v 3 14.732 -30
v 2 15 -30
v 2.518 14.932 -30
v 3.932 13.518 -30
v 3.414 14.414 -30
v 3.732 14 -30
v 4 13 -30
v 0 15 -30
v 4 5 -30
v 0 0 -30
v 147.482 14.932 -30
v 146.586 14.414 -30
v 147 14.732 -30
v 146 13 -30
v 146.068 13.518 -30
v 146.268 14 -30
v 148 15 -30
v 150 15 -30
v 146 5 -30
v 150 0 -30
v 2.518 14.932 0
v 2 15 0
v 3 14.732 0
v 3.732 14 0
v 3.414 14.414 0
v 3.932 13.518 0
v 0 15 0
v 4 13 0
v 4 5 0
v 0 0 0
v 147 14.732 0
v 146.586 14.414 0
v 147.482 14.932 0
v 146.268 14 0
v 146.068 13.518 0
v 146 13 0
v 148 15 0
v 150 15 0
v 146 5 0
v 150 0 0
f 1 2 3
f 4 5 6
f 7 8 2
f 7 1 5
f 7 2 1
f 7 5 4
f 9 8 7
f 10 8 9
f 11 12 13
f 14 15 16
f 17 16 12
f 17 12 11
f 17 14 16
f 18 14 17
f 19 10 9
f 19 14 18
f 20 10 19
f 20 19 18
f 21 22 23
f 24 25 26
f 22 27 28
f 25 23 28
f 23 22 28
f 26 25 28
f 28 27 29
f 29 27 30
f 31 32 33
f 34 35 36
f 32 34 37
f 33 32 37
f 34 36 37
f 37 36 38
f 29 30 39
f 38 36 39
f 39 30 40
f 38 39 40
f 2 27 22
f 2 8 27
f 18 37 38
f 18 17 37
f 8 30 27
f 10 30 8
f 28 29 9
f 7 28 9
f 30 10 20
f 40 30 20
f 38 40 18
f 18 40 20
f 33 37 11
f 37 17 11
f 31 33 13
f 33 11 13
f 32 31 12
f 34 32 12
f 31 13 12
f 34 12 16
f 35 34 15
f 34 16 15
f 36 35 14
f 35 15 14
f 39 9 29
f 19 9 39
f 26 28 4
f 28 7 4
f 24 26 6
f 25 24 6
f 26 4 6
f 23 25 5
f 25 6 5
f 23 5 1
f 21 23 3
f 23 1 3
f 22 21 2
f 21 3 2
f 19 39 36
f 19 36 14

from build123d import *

# Parameters (mm, degrees)
SKETCH1_W           = 150
SKETCH1_H           = 30
BOSS_EXTRUDE1_DEPTH = 5
SKETCH3_W           = 4
SKETCH3_H           = 30
BOSS_EXTRUDE2_DEPTH = 10
SKETCH4_W           = 4
SKETCH4_H           = 30
BOSS_EXTRUDE3_DEPTH = 10
FILLET1_R           = 2


with BuildPart() as part:
    # Sketch1 → Boss-Extrude1 (new body)
    with BuildSketch(Plane(origin=(0, 0, 0), x_dir=(1, 0, 0), z_dir=(0, 1, 0))):
        with Locations((75, 15)):
            Rectangle(SKETCH1_W, SKETCH1_H)
    extrude(amount=BOSS_EXTRUDE1_DEPTH)

    # Sketch3 → Boss-Extrude2 (add)
    with BuildSketch(Plane(origin=(0, 5, 0), x_dir=(1, 0, 0), z_dir=(0, 1, 0))):
        with Locations((148, 15)):
            Rectangle(SKETCH3_W, SKETCH3_H)
    extrude(amount=BOSS_EXTRUDE2_DEPTH)

    # Sketch4 → Boss-Extrude3 (add)
    with BuildSketch(Plane(origin=(0, 5, 0), x_dir=(1, 0, 0), z_dir=(0, 1, 0))):
        with Locations((2, 15)):
            Rectangle(SKETCH4_W, SKETCH4_H)
    extrude(amount=BOSS_EXTRUDE3_DEPTH)

    # Fillet1
    fillet1_edges = [part.edges().sort_by_distance(p)[0] for p in [
        (146, 15, -15),
        (4, 15, -15),
    ]]
    fillet(fillet1_edges, radius=FILLET1_R)


solid = part.part
